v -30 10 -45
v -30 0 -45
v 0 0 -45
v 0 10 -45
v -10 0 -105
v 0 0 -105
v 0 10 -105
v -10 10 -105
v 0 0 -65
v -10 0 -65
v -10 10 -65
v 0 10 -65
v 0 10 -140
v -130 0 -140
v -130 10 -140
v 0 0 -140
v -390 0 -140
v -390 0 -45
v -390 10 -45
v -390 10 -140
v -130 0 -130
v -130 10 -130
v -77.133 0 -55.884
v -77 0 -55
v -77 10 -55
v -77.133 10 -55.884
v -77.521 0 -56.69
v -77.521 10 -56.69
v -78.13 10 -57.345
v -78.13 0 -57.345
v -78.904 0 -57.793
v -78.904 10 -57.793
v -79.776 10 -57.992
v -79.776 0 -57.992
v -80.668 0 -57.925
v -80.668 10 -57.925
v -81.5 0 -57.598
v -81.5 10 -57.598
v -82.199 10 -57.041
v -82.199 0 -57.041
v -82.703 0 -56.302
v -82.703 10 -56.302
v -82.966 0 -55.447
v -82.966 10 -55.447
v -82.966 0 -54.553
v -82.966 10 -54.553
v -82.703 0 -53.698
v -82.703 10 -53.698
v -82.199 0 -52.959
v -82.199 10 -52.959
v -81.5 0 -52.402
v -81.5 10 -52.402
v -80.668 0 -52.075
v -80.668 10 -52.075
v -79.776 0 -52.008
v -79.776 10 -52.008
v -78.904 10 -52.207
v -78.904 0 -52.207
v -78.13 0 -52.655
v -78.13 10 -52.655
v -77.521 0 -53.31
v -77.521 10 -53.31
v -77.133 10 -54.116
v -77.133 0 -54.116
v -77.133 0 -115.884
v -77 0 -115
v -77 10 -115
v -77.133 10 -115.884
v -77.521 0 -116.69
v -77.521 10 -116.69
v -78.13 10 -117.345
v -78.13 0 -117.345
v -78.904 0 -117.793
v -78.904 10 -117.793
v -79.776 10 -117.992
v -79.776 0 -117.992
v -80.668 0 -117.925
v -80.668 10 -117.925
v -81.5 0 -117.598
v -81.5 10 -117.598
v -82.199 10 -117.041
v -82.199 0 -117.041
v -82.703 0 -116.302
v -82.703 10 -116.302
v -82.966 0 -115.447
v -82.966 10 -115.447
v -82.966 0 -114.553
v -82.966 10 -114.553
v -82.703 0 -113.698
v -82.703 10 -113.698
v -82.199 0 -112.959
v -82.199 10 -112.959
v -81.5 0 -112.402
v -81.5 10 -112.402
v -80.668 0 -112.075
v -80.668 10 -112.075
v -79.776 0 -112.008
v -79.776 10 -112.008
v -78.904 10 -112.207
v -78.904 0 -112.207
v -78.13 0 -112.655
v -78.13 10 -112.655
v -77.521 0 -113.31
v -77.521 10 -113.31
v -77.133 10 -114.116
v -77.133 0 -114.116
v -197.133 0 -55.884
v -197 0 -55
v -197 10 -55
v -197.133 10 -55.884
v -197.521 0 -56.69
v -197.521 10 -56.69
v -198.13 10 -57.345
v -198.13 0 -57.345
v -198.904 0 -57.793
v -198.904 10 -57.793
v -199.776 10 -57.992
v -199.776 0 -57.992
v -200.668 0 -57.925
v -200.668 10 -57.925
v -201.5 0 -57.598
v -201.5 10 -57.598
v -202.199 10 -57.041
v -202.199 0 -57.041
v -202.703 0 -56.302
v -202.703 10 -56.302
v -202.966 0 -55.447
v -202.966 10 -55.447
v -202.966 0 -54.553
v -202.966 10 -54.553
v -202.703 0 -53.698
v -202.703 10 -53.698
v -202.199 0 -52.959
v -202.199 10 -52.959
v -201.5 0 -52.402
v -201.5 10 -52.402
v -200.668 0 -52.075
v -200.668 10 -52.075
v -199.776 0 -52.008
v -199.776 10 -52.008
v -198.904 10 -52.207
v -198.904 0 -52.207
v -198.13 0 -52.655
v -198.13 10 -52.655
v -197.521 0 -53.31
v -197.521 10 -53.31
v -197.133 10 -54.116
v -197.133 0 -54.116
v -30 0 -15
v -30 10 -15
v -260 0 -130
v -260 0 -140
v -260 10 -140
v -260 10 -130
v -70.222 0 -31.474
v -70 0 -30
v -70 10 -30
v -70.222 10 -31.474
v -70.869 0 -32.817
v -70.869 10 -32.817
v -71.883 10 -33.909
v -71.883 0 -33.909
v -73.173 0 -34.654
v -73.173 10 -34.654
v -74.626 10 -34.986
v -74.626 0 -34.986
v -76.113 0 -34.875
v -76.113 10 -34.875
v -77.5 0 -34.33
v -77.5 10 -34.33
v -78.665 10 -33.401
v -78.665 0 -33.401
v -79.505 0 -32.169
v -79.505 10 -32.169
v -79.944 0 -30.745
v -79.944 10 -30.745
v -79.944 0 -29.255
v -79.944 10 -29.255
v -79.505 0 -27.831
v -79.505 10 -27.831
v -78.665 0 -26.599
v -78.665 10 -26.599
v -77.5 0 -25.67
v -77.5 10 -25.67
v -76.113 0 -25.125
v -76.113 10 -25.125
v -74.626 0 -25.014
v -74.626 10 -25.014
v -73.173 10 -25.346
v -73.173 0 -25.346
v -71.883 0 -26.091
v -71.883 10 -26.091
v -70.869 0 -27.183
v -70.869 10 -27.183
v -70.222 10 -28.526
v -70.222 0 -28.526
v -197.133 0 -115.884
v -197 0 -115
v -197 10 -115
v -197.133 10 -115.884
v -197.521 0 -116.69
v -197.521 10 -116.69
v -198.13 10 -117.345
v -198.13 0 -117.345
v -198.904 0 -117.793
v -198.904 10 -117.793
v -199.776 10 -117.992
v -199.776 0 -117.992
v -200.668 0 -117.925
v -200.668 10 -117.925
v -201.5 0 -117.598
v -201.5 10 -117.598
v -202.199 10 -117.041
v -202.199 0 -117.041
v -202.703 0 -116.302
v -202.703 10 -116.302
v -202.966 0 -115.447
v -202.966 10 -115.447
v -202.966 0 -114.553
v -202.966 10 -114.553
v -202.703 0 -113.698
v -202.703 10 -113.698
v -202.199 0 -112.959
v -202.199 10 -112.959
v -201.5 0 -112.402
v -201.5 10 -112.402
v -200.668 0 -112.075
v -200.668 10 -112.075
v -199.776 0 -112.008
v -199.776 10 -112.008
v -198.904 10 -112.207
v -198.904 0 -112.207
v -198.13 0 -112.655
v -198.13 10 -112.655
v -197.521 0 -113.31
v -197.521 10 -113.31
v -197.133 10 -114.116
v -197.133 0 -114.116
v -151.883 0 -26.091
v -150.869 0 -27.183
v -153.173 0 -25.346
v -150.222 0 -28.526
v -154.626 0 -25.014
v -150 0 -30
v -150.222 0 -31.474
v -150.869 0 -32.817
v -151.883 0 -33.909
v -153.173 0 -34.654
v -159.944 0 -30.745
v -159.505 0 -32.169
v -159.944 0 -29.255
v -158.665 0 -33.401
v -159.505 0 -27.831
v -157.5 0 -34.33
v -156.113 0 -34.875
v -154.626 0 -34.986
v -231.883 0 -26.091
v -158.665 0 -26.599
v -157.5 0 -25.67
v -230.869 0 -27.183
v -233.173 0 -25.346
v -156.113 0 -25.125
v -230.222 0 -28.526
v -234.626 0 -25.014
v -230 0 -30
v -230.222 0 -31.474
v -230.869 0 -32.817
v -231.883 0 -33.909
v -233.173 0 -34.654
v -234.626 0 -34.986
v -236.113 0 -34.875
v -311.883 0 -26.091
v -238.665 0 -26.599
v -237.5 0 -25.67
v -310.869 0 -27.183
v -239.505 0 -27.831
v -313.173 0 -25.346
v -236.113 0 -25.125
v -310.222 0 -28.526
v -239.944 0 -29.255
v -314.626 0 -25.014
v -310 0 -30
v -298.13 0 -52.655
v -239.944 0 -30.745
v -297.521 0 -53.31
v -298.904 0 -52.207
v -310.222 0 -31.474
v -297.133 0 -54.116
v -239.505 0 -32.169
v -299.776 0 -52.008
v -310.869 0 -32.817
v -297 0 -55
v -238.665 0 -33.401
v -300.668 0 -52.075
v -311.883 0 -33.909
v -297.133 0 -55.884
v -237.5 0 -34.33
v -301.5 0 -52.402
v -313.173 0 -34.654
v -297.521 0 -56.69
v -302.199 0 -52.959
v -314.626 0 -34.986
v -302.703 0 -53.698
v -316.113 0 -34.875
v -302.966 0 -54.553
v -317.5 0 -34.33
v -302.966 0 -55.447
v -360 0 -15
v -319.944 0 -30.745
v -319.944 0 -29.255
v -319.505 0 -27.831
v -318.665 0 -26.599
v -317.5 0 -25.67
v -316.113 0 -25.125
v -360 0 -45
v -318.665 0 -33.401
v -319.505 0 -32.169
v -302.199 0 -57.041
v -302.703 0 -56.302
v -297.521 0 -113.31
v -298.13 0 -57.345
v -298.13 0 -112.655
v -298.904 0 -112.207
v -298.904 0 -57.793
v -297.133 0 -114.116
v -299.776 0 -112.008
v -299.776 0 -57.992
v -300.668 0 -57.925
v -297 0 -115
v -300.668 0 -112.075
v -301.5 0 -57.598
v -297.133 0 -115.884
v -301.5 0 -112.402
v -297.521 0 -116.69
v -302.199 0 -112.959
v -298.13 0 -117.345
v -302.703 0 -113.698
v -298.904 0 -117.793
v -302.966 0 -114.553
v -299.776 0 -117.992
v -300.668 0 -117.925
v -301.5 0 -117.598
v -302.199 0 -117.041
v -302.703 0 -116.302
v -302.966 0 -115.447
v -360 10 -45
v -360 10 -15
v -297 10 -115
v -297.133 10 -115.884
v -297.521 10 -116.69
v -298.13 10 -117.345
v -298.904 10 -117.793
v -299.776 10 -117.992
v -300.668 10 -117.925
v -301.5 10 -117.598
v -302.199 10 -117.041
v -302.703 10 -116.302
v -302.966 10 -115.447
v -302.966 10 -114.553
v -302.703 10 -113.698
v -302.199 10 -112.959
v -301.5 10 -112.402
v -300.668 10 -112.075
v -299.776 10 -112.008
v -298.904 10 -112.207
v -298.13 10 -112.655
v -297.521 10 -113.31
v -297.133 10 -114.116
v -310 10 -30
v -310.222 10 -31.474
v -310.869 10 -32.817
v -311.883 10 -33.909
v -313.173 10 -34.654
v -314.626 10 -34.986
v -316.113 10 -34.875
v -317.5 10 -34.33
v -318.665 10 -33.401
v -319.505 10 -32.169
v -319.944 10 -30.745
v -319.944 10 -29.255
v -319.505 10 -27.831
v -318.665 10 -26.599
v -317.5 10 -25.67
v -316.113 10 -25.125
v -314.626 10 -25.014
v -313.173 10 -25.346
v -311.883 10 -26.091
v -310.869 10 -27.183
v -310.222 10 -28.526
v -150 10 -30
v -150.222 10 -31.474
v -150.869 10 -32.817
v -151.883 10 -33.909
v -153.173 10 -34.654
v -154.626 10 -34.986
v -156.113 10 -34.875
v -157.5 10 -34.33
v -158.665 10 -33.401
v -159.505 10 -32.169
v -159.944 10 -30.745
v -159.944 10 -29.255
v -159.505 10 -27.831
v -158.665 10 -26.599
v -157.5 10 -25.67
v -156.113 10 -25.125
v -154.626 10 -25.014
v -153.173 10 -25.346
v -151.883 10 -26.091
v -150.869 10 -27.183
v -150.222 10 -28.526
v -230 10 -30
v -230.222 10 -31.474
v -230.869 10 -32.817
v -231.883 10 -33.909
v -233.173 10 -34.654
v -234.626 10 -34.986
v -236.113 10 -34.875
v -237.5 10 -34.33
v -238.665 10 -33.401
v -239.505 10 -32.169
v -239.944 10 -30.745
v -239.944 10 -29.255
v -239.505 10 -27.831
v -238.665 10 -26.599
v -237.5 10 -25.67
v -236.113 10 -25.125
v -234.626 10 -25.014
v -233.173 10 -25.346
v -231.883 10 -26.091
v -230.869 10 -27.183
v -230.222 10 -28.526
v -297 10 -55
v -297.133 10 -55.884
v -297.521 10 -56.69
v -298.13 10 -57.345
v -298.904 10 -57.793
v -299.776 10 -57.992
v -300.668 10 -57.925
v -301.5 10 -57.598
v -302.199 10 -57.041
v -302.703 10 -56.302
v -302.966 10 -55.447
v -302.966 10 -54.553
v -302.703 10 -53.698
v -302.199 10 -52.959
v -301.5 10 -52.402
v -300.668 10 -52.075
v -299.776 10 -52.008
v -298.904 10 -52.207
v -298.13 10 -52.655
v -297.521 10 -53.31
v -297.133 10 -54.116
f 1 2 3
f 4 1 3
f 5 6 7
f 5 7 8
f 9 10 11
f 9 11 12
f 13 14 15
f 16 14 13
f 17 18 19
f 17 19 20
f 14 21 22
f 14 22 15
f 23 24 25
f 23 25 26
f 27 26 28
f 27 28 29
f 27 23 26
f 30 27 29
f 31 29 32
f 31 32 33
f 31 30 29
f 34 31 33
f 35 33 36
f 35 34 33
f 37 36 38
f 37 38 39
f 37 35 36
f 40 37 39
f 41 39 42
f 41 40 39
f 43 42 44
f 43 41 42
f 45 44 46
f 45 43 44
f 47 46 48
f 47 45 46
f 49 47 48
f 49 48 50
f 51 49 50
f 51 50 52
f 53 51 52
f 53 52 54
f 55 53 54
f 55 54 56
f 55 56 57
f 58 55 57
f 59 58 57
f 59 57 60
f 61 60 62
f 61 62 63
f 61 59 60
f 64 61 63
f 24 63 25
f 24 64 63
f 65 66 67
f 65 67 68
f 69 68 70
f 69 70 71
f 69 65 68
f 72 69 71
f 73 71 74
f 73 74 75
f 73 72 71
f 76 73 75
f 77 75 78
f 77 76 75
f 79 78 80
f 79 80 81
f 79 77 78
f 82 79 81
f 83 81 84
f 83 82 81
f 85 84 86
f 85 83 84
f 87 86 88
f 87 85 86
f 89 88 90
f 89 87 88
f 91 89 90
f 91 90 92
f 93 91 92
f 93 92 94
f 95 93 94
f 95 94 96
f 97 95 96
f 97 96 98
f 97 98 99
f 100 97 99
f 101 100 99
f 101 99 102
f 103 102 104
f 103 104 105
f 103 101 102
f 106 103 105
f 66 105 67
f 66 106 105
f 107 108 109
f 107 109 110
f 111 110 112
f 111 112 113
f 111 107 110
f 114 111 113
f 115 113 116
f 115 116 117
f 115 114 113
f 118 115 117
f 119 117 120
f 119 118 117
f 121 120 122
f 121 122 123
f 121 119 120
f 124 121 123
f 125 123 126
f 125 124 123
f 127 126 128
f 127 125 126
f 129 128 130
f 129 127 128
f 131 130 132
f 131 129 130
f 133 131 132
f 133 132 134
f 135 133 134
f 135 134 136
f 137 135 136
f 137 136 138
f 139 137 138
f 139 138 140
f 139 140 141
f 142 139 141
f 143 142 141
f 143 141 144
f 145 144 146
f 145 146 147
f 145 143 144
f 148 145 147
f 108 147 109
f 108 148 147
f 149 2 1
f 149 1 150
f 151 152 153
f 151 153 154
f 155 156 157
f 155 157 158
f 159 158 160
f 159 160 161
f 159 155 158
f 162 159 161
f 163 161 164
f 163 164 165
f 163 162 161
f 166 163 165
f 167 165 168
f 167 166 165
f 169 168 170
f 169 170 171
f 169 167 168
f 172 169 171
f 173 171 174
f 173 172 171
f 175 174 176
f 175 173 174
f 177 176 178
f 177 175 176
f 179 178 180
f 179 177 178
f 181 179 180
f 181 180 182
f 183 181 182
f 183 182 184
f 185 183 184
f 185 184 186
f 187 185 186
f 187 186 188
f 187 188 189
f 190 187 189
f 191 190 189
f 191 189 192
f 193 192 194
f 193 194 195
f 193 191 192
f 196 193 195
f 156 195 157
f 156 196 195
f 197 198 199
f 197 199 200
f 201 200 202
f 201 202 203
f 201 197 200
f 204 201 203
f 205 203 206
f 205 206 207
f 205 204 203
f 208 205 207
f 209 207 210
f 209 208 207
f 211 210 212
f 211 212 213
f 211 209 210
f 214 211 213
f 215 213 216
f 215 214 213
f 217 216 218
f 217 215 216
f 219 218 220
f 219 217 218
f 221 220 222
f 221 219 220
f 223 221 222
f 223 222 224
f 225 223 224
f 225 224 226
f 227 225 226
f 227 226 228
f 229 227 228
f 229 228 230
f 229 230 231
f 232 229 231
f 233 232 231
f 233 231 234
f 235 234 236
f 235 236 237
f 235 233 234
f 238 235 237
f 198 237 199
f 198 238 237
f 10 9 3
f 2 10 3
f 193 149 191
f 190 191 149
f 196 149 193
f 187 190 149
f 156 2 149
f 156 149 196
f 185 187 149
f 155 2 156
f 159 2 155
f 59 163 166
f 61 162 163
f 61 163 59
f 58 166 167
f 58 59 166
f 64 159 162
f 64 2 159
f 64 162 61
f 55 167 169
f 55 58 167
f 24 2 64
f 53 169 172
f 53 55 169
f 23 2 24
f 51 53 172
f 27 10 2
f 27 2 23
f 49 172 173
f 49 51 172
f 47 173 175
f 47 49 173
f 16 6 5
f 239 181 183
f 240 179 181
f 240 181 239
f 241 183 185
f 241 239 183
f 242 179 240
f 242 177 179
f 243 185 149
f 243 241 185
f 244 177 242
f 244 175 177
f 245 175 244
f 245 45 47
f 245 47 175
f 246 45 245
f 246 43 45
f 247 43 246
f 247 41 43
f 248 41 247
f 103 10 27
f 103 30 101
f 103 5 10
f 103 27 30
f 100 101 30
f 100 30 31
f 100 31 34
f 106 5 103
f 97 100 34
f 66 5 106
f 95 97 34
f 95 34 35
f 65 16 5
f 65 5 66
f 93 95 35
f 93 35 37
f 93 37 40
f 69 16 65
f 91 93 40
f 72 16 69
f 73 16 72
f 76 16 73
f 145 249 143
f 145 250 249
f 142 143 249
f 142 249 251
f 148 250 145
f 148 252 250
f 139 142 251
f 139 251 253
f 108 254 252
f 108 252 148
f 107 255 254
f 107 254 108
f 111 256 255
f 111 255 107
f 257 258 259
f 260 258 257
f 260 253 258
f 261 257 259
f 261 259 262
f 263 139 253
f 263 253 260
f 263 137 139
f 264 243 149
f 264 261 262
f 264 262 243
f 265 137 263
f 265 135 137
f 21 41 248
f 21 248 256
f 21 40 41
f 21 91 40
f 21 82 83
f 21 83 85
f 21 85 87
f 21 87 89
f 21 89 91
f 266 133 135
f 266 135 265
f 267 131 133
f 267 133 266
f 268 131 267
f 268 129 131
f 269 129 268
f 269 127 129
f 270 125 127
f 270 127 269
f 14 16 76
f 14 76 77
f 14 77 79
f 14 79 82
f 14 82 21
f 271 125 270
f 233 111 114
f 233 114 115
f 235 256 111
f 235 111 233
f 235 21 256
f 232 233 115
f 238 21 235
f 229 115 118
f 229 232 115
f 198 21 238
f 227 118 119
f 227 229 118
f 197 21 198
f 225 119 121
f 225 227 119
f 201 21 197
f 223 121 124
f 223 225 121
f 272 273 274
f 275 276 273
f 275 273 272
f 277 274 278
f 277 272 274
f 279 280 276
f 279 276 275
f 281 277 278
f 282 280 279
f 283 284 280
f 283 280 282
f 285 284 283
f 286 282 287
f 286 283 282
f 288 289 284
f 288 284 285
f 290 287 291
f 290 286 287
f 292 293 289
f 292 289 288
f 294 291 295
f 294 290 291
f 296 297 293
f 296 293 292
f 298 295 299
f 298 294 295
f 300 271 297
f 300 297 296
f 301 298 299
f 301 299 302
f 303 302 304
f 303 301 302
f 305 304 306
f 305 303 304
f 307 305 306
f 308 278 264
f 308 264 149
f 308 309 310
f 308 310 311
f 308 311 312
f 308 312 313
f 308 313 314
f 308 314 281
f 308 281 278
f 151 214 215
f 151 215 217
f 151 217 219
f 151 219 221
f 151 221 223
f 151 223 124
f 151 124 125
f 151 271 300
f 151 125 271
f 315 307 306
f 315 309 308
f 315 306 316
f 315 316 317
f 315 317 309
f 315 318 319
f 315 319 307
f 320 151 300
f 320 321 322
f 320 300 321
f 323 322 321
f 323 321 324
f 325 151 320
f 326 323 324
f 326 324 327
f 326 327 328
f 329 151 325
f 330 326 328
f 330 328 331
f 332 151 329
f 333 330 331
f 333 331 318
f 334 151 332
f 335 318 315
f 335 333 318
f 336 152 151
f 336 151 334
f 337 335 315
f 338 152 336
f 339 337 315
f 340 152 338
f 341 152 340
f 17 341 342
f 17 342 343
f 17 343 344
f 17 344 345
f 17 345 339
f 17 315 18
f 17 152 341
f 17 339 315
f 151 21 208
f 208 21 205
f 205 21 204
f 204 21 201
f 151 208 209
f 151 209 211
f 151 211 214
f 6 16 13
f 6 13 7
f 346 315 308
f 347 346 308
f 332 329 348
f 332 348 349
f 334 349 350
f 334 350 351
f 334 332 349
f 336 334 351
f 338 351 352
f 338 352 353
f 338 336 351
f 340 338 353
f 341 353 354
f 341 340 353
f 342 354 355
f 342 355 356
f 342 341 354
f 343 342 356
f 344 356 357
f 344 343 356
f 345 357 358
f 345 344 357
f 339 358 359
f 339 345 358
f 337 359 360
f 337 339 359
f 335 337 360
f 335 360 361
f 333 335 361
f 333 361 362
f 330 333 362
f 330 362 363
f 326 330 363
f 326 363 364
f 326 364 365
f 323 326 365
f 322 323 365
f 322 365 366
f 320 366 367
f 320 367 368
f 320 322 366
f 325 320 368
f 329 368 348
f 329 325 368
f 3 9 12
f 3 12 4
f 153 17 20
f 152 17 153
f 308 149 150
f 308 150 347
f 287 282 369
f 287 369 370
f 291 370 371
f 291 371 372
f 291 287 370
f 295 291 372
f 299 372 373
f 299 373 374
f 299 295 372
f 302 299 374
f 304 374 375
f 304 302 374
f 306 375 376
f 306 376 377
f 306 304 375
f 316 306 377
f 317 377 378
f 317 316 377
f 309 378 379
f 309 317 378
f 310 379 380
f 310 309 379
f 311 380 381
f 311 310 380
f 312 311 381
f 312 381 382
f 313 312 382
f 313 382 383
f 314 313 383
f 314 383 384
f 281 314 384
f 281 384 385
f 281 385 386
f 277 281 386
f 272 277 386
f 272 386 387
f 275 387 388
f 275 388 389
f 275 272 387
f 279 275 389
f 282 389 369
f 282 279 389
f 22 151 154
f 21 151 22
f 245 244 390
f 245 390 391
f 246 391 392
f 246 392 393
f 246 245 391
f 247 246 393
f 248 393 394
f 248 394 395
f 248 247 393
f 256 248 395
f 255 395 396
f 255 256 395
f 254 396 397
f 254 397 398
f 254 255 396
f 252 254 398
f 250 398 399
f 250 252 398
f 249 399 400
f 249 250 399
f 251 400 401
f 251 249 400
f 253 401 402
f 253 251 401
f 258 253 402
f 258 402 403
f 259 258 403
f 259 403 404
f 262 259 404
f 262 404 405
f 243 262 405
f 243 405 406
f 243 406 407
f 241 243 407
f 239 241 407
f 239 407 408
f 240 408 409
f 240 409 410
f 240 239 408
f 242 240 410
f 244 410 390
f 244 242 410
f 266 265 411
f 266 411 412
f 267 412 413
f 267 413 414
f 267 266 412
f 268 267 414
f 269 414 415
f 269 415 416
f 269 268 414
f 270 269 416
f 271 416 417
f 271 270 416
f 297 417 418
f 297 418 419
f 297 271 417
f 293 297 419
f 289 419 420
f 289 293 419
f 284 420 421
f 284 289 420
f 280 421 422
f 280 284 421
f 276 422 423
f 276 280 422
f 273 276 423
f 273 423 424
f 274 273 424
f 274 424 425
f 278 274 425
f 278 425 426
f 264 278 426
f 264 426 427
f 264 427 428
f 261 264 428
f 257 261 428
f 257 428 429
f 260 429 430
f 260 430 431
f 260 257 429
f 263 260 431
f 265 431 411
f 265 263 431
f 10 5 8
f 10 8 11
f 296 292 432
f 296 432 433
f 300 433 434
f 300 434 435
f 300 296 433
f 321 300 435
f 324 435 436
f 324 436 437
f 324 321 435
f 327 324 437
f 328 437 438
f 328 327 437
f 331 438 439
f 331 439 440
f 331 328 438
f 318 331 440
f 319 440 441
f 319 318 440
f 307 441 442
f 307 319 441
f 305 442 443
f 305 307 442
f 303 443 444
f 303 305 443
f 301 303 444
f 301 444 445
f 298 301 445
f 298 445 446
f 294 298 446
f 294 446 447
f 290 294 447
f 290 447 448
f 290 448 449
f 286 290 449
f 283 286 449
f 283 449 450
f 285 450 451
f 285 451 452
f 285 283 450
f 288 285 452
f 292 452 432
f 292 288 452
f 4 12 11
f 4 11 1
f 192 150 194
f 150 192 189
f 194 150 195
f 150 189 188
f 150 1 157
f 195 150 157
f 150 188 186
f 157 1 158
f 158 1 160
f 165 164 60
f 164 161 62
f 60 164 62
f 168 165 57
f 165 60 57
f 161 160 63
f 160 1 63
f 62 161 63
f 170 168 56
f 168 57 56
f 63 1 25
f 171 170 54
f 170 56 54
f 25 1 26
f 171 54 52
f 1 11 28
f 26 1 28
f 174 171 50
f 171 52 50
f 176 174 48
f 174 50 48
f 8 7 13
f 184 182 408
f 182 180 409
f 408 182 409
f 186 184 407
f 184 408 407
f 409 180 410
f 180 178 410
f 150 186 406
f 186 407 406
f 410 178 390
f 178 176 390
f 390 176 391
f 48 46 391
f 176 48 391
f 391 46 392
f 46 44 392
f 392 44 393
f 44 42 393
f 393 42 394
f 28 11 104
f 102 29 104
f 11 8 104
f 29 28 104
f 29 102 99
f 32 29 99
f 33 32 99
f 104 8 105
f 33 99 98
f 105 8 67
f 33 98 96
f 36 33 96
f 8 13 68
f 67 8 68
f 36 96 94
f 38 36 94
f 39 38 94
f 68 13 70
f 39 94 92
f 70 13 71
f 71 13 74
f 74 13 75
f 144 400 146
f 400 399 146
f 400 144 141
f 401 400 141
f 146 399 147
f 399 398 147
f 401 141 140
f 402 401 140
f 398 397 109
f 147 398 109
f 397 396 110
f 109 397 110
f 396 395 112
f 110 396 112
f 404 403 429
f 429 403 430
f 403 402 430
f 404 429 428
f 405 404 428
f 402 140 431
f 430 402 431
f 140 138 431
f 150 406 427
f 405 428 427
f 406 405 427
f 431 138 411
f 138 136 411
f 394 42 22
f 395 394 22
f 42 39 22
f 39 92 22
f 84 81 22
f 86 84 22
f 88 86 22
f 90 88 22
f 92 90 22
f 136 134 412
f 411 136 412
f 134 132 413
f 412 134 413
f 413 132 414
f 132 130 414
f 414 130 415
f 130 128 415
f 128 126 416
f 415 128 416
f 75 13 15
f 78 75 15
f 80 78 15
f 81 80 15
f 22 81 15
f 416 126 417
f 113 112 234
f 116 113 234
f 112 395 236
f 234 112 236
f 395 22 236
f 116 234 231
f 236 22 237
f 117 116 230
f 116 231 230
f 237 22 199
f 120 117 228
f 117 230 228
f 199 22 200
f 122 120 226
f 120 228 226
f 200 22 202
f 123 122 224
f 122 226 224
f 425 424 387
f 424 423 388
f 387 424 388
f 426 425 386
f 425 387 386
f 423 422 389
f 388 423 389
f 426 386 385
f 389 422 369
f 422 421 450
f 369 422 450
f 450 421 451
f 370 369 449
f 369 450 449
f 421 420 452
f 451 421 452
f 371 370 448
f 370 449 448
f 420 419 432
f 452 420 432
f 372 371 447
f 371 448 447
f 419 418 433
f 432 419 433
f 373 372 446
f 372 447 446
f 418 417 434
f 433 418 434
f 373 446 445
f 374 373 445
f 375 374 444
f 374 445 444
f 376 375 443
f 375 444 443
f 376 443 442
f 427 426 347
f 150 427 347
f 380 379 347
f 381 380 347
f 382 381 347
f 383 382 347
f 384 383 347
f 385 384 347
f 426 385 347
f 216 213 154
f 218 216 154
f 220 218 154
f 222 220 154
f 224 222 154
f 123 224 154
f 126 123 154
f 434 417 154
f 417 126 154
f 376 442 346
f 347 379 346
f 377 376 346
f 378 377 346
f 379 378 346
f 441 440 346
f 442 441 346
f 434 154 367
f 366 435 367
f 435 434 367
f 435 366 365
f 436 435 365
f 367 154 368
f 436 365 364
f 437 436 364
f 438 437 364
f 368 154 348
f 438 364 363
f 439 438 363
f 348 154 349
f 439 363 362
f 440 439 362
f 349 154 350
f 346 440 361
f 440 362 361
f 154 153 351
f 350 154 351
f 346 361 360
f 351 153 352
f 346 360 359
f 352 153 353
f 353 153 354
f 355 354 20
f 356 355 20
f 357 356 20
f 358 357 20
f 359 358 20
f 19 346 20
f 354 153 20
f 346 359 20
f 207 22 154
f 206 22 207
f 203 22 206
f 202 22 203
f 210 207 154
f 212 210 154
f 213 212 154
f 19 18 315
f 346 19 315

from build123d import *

# Parameters (mm, degrees)
SKETCH1_R           = 5
SKETCH1_R_2         = 3
BOSS_EXTRUDE1_DEPTH = 10
SKETCH2_W           = 30
SKETCH2_H           = 30
CUT_EXTRUDE1_DEPTH  = 10


with BuildPart() as part:
    # Sketch1 → Boss-Extrude1 (new body)
    with BuildSketch(Plane(origin=(0, 0, 0), x_dir=(1, 0, 0), z_dir=(0, 1, 0))):
        Polygon((0, 15), (-390, 15), (-390, 140), (-260, 140), (-260, 130), (-130, 130), (-130, 140), (0, 140), (0, 105), (-10, 105), (-10, 65), (0, 65), align=None)
        with Locations((-315, 30)):
            Circle(SKETCH1_R, mode=Mode.SUBTRACT)
        with Locations((-235, 30)):
            Circle(SKETCH1_R, mode=Mode.SUBTRACT)
        with Locations((-155, 30)):
            Circle(SKETCH1_R, mode=Mode.SUBTRACT)
        with Locations((-75, 30)):
            Circle(SKETCH1_R, mode=Mode.SUBTRACT)
        with Locations((-80, 55)):
            Circle(SKETCH1_R_2, mode=Mode.SUBTRACT)
        with Locations((-200, 55)):
            Circle(SKETCH1_R_2, mode=Mode.SUBTRACT)
        with Locations((-300, 55)):
            Circle(SKETCH1_R_2, mode=Mode.SUBTRACT)
        with Locations((-300, 115)):
            Circle(SKETCH1_R_2, mode=Mode.SUBTRACT)
        with Locations((-200, 115)):
            Circle(SKETCH1_R_2, mode=Mode.SUBTRACT)
        with Locations((-80, 115)):
            Circle(SKETCH1_R_2, mode=Mode.SUBTRACT)
    extrude(amount=BOSS_EXTRUDE1_DEPTH)

    # Sketch2 → Cut-Extrude1 (cut)
    with BuildSketch(Plane.XZ):
        with Locations((-15, -30)):
            Rectangle(SKETCH2_W, SKETCH2_H)
        with Locations((-375, -30)):
            Rectangle(SKETCH2_W, SKETCH2_H)
    extrude(amount=-CUT_EXTRUDE1_DEPTH, mode=Mode.SUBTRACT)


solid = part.part
